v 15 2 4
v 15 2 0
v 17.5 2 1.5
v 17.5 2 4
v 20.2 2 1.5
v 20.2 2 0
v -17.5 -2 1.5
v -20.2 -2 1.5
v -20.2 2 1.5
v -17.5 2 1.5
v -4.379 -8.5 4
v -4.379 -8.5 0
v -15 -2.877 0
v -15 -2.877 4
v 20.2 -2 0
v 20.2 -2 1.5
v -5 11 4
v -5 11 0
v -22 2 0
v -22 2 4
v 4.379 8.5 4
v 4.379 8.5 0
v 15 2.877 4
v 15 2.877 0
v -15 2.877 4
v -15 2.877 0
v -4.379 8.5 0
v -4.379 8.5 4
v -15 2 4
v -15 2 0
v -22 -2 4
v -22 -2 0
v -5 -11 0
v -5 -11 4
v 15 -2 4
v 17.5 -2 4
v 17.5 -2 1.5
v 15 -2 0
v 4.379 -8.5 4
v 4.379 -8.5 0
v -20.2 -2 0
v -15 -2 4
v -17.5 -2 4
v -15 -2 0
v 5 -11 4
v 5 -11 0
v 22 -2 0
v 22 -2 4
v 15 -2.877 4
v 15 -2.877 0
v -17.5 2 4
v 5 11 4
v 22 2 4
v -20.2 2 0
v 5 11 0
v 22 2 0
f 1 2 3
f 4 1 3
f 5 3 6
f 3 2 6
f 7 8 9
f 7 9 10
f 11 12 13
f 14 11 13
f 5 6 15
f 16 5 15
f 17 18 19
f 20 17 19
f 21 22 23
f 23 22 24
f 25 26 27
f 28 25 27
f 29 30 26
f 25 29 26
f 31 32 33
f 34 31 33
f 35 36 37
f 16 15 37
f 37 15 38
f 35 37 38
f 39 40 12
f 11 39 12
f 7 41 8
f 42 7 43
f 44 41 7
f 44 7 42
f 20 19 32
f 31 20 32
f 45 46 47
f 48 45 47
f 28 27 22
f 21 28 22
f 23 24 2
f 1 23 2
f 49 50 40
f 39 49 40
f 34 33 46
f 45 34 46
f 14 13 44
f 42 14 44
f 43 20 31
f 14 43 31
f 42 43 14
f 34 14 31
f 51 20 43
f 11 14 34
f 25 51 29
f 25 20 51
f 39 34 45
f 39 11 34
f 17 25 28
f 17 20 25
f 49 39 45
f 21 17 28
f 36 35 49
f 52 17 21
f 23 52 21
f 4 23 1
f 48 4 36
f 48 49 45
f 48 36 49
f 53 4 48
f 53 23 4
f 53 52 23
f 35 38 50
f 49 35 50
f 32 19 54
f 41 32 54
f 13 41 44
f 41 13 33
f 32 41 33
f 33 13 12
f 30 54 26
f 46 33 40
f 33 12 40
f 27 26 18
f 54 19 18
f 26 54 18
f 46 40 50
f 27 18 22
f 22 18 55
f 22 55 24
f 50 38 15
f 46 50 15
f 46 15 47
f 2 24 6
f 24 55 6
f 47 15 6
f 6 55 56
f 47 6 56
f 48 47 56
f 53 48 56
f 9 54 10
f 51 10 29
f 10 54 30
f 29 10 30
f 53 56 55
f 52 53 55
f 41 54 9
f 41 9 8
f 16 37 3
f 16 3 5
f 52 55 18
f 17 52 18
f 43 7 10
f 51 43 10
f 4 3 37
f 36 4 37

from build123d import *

# Parameters (mm, degrees)
F1_DEPTH = 4
F2_W     = 2.7
F2_H     = 4
F3_DEPTH = 1.5


with BuildPart() as f1:
    # F0 (on Top) → F1 (new body)
    with BuildSketch(Plane.XY):
        Polygon((-5, -11), (5, -11), (22, -2), (22, 2), (5, 11), (-5, 11), (-22, 2), (-22, -2), align=None)
        Polygon((15.0000007647, -2.8771487377), (4.3790599258, -8.4999997701), (-4.3790599258, -8.4999997701), (-14.9999995266, -2.8771493931), (-14.9999995266, -2), (-17.5000002913, -2), (-17.5, 2), (-14.9999995266, 2), (-14.9999995266, 2.8771493931), (-4.3790599258, 8.4999997701), (4.3790599258, 8.4999997701), (15.0000007647, 2.8771487377), (15.0000007647, 2), (17.5000002913, 2), (17.5, -2), (15.0000007647, -2), align=None, mode=Mode.SUBTRACT)
    extrude(amount=F1_DEPTH)

    # F2 (on face) → F3 (cut)
    with BuildSketch(Plane(origin=(0, 0, 0), x_dir=(1, 0, 0), z_dir=(0, 0, -1))):
        with Locations((-18.85, 0)):
            Rectangle(F2_W, F2_H)
        with Locations((18.85, 0)):
            Rectangle(F2_W, F2_H)
    extrude(amount=-F3_DEPTH, mode=Mode.SUBTRACT)


solid = f1.part
